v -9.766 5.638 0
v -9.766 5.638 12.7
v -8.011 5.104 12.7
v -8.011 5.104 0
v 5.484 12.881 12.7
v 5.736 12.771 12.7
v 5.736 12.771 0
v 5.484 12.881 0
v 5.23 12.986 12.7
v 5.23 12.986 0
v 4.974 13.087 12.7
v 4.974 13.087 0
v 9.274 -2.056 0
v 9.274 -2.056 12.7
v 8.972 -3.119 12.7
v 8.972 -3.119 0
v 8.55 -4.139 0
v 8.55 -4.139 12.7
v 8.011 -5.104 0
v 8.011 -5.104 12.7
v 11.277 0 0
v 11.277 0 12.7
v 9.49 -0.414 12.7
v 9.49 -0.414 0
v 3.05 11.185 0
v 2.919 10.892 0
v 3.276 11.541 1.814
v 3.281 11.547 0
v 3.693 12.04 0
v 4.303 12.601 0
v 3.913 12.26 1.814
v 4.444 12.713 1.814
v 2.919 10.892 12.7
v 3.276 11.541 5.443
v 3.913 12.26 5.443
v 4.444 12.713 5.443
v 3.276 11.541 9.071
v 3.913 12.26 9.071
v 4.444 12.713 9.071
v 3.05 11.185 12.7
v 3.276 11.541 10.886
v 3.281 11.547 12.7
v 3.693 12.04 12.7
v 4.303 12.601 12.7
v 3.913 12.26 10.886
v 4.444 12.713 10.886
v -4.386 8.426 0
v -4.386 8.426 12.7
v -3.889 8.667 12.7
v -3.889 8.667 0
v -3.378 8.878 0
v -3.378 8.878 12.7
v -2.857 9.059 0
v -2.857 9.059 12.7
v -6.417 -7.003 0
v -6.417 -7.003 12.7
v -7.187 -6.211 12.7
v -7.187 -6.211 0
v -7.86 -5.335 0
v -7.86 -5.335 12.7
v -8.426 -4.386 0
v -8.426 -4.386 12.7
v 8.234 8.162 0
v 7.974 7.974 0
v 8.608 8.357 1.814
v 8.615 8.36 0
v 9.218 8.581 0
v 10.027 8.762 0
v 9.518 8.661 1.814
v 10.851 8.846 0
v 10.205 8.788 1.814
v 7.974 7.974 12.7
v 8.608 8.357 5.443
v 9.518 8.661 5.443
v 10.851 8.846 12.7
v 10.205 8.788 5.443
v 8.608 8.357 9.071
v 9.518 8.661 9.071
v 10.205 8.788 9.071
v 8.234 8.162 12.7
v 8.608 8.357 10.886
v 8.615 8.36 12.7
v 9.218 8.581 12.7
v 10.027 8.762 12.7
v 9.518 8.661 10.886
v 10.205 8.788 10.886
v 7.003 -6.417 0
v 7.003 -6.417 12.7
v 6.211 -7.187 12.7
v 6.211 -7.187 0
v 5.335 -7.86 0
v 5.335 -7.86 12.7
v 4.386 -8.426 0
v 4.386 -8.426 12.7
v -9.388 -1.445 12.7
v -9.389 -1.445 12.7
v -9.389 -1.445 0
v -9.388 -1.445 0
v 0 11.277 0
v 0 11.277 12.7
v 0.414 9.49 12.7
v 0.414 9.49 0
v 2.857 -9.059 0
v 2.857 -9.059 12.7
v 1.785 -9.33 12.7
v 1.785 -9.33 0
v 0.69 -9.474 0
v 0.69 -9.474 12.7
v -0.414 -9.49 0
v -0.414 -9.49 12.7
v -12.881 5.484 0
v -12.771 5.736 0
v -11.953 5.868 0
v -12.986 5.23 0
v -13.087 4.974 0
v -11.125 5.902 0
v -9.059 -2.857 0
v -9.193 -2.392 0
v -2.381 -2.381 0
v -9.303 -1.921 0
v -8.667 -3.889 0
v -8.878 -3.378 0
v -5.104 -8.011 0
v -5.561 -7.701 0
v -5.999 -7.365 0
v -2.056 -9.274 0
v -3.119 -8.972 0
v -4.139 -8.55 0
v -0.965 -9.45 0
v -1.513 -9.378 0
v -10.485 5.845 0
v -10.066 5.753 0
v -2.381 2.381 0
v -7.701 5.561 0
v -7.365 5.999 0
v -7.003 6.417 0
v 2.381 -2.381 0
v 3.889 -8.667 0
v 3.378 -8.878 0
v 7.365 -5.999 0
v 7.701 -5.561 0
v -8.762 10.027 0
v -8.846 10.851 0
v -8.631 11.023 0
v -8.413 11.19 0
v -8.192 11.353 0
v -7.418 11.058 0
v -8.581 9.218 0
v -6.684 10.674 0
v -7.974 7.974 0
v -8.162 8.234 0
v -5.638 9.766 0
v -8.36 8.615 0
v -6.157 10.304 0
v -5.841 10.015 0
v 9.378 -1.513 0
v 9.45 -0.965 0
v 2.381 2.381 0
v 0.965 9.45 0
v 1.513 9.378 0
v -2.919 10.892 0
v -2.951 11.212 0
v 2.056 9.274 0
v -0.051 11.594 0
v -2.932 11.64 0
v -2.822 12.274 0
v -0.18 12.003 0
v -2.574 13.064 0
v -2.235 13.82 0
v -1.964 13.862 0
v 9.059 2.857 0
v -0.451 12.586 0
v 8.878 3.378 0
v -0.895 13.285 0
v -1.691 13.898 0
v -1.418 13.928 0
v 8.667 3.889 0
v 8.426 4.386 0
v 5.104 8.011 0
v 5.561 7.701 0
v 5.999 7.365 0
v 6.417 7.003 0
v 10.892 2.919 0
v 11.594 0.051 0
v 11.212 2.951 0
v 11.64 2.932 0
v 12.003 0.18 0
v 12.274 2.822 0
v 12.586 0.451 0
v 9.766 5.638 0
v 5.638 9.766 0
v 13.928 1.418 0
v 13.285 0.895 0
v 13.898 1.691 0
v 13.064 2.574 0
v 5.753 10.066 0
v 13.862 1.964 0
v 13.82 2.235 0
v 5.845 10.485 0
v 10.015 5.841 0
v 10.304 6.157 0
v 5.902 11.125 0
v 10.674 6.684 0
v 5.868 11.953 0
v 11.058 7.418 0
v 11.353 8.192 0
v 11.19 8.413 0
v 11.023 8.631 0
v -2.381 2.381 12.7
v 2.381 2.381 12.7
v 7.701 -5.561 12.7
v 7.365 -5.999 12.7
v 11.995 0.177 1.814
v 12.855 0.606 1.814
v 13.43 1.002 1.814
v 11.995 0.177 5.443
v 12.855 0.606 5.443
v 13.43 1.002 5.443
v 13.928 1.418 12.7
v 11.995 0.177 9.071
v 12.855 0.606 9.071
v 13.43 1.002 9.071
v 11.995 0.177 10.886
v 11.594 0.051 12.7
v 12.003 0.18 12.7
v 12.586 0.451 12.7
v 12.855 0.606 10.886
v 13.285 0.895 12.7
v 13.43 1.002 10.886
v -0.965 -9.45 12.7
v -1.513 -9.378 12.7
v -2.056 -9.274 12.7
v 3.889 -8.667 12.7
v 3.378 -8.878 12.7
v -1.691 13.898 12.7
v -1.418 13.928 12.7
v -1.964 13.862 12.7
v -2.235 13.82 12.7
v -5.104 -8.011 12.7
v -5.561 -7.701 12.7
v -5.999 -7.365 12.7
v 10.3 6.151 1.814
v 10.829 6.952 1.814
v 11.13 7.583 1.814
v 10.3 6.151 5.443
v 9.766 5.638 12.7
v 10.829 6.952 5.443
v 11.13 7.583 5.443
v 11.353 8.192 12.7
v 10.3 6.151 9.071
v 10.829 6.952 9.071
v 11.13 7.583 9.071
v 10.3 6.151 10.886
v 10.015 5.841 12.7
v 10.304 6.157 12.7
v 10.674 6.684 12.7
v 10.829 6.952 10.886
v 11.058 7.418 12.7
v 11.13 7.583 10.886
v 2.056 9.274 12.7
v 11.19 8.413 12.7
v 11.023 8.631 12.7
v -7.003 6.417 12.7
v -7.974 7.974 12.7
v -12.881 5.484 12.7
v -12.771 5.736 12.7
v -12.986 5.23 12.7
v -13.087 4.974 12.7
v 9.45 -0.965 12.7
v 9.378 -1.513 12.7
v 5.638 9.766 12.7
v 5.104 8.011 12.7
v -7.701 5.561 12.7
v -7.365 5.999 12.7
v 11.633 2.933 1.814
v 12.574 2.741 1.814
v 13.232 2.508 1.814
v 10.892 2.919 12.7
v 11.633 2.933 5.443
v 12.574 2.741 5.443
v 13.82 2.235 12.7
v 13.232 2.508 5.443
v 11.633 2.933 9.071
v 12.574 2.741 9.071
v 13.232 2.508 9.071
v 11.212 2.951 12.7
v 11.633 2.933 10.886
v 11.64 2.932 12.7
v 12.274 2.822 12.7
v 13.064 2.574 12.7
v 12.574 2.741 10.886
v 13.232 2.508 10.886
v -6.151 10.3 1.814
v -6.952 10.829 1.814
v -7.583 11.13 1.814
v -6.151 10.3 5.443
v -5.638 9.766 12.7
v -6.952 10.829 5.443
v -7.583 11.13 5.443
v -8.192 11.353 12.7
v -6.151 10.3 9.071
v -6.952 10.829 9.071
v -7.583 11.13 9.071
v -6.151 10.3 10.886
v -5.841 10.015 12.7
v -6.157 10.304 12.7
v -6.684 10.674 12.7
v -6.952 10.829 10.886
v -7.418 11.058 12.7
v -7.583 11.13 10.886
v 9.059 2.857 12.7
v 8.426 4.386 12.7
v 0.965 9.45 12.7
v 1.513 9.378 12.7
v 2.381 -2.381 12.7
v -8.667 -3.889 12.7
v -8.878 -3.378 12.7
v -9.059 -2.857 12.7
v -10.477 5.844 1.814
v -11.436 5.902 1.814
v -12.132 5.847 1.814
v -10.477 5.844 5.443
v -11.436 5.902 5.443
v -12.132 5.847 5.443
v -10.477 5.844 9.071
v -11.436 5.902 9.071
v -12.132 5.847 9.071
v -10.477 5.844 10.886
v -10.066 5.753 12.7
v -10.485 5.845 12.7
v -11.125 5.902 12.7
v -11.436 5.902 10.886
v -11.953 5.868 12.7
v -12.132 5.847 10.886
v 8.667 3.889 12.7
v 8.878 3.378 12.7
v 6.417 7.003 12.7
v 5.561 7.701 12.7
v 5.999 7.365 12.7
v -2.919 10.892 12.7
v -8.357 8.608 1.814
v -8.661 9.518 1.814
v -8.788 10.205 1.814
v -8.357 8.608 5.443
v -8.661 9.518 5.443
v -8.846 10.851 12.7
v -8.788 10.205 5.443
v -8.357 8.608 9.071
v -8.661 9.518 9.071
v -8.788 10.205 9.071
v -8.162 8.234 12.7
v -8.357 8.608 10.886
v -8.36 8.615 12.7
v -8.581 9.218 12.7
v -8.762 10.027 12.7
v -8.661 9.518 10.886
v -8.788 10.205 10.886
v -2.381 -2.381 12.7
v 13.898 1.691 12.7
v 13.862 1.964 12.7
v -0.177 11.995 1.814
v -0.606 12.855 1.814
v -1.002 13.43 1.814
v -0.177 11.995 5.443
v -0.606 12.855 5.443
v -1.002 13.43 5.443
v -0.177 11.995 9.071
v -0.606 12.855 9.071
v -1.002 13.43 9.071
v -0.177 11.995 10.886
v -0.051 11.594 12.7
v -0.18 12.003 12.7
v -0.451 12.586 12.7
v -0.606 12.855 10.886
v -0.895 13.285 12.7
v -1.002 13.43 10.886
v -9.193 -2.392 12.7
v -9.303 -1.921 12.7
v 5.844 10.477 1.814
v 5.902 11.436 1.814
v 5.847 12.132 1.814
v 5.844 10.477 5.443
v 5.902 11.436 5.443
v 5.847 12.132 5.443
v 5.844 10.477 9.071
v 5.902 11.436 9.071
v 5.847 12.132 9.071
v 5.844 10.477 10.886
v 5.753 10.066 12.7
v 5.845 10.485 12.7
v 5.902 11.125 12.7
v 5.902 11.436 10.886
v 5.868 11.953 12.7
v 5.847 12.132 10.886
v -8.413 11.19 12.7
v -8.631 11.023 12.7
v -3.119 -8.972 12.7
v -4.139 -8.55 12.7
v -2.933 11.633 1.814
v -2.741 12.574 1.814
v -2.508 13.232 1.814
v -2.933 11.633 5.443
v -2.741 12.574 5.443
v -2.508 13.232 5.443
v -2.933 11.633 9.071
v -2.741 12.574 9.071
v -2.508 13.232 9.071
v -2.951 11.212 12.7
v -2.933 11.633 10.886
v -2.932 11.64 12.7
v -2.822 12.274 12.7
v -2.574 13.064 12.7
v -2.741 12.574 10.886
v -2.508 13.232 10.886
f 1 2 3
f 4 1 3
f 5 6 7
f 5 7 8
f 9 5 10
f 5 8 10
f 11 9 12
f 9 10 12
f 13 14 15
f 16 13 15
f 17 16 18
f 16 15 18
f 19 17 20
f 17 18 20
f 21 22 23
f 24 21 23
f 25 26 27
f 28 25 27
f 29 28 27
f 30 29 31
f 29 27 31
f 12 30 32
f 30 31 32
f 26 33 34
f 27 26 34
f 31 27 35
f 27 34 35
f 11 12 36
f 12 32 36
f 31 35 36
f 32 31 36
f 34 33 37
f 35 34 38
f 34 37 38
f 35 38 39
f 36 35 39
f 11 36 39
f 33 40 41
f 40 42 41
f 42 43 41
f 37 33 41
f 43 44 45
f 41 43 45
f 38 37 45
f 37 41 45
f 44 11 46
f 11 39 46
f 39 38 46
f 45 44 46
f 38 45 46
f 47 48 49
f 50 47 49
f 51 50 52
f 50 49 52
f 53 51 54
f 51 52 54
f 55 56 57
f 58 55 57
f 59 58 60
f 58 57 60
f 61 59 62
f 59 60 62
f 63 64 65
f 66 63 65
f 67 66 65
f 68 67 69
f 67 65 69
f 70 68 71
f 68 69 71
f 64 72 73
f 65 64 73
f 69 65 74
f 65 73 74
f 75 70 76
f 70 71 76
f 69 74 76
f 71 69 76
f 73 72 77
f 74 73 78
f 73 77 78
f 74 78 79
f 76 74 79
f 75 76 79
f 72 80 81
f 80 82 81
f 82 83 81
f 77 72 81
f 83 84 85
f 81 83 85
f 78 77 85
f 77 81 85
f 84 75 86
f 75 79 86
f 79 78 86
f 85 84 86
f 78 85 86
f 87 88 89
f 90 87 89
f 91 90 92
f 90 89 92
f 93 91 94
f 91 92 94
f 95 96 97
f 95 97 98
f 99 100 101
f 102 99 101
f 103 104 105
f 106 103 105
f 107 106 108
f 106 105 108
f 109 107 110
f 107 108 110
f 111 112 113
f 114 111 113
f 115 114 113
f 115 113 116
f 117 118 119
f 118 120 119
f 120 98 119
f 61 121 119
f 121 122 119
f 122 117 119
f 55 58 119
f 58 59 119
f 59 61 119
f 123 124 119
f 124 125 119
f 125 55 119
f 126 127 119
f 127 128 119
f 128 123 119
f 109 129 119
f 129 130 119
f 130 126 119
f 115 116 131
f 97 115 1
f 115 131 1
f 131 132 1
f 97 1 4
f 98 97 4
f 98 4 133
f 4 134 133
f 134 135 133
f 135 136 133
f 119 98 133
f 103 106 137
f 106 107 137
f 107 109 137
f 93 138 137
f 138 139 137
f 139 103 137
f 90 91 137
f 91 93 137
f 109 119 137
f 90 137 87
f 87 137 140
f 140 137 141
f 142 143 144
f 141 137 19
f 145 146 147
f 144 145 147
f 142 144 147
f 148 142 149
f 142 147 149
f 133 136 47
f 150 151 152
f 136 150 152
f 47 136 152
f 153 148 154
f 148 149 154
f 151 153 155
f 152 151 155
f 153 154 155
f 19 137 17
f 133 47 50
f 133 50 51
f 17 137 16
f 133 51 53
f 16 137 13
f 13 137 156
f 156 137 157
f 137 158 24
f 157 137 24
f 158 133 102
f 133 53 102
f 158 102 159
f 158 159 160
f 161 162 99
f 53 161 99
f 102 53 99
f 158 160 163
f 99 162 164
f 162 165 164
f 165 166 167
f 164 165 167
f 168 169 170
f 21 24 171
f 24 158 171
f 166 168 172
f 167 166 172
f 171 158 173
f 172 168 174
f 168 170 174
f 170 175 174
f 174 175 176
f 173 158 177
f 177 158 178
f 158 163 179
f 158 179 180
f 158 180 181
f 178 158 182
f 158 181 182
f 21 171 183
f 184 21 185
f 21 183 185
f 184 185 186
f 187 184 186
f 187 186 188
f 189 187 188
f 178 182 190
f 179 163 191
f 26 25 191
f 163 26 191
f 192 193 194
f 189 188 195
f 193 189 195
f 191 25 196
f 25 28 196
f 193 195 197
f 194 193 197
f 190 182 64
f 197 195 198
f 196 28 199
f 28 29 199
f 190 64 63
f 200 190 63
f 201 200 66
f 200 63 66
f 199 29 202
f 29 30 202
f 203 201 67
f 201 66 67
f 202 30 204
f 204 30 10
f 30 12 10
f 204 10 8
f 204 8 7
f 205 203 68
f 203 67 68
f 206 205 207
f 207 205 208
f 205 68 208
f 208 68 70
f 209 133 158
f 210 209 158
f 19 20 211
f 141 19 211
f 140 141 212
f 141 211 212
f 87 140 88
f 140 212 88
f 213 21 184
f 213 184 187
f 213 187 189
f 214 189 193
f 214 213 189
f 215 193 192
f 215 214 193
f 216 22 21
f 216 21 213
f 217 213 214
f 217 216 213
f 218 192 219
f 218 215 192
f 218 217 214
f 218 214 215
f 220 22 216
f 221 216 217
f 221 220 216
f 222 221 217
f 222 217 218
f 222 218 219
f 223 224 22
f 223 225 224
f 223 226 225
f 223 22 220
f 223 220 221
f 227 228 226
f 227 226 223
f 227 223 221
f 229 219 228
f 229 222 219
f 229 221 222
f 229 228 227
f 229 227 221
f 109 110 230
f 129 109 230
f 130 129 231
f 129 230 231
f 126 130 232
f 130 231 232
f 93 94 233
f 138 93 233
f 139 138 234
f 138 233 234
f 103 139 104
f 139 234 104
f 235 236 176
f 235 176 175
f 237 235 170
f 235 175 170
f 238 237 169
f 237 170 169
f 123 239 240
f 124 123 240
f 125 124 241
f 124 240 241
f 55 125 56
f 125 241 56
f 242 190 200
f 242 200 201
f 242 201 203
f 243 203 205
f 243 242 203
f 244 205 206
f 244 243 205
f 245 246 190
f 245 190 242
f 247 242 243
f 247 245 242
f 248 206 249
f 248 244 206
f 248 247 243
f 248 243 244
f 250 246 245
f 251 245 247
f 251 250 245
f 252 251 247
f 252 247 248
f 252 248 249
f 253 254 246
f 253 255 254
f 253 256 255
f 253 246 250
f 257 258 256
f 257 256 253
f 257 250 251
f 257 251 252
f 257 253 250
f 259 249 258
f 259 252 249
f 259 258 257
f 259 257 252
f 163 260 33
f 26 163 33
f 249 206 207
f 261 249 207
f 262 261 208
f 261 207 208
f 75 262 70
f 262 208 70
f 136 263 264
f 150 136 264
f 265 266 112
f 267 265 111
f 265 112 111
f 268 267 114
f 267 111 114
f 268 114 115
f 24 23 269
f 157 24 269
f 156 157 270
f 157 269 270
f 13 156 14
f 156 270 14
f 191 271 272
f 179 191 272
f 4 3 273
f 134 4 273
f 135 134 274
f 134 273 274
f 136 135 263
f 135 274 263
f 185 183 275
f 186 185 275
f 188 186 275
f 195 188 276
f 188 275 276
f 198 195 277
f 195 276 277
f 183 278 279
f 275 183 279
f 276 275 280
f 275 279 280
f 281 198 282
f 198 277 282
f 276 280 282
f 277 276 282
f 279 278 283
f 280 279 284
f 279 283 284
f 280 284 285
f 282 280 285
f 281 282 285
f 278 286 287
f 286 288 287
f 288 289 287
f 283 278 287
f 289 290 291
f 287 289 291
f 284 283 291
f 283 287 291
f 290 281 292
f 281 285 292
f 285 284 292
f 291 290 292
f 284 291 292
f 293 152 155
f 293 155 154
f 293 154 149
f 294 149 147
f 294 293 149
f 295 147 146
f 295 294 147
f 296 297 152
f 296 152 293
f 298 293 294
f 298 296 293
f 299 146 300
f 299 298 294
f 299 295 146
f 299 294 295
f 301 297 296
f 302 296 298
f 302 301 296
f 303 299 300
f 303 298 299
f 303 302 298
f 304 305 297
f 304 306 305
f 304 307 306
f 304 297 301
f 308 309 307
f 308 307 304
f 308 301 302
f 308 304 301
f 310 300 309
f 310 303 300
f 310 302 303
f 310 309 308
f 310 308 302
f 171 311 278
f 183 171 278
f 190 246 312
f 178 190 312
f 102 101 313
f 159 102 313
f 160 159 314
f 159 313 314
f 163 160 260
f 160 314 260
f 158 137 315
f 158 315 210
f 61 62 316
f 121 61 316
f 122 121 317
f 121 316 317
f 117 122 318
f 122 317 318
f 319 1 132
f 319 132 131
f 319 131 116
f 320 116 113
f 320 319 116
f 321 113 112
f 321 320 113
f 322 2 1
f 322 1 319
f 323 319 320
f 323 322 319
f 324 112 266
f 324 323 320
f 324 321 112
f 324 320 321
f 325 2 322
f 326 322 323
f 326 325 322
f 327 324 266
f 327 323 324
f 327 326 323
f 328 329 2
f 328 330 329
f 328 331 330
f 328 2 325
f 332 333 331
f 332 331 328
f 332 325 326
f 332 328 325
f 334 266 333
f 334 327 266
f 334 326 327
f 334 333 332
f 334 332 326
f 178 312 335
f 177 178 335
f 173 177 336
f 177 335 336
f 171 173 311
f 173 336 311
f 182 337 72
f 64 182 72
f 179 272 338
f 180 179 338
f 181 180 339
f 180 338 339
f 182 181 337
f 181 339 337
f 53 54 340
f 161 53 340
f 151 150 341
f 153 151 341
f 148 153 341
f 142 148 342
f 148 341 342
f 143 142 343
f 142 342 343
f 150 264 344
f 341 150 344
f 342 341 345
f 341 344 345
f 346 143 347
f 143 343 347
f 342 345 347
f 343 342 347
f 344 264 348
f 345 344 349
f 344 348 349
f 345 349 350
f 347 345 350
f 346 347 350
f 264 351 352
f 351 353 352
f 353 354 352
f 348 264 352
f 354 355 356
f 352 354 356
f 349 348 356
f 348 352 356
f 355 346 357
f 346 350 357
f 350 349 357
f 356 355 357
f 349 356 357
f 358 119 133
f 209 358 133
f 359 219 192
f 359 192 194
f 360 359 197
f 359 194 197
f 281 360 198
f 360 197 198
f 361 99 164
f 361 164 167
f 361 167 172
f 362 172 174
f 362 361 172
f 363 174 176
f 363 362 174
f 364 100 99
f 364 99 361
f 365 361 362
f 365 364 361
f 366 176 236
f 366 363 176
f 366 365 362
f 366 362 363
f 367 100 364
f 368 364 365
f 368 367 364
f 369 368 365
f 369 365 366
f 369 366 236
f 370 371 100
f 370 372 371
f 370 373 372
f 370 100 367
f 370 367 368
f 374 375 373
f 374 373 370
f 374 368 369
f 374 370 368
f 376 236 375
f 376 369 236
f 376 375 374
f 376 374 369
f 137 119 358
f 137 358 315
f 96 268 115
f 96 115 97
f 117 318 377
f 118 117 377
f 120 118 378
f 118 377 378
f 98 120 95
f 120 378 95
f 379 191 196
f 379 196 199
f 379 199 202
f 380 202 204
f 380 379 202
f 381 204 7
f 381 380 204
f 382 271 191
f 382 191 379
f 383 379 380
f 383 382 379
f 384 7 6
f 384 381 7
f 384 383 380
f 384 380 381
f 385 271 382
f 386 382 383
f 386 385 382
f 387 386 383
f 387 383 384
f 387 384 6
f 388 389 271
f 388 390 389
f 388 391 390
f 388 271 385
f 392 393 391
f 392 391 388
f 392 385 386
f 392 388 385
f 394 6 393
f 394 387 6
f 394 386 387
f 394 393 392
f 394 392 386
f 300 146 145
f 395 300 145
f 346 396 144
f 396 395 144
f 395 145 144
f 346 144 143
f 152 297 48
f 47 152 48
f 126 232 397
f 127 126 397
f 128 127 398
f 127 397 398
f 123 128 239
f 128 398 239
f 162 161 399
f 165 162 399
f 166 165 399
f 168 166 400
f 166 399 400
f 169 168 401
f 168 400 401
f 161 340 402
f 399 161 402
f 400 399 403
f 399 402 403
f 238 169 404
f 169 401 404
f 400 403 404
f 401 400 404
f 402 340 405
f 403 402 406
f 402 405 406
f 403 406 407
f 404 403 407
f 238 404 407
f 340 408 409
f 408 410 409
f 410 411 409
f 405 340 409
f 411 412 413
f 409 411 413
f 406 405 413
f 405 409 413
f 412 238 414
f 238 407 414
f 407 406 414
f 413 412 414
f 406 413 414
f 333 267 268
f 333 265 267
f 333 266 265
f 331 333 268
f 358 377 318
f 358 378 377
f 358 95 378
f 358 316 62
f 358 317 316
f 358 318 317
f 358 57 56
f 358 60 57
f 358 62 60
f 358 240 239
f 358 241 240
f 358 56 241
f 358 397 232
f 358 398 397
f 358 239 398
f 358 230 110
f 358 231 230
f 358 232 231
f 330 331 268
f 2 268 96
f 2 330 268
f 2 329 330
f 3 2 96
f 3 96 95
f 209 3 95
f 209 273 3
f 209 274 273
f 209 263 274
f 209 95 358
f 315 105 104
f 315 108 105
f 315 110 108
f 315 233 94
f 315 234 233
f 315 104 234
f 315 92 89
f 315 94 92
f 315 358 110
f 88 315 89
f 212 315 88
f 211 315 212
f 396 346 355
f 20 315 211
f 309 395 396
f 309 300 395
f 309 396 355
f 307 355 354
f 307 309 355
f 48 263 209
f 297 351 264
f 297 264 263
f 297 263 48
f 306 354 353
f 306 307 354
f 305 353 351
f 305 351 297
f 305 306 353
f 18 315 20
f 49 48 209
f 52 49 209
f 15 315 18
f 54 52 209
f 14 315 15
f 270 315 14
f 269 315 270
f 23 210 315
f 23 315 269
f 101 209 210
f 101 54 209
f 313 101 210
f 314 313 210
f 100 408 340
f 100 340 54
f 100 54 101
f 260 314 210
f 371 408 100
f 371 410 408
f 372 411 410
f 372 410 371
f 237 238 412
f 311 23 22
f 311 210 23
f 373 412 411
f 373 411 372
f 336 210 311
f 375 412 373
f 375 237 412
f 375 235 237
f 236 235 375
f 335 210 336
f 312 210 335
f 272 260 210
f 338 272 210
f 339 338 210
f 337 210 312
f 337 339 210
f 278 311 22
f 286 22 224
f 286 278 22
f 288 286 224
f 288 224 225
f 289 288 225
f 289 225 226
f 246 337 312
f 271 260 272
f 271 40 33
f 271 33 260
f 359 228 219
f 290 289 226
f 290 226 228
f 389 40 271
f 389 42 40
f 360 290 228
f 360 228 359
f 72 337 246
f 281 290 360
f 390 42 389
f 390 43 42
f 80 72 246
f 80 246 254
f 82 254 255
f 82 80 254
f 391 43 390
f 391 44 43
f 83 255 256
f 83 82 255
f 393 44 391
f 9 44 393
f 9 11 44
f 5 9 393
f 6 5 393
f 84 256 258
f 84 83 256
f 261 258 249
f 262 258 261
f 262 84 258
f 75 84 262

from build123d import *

# Parameters (mm, degrees)
SKETCH1_R           = 14
SKETCH1_W           = 4.7625
SKETCH1_H           = 4.7625
BOSS_EXTRUDE1_DEPTH = 12.7
CUT_EXTRUDE2_DEPTH  = 12.7
CIRPATTERN1_COUNT   = 12
CUT_EXTRUDE3_DEPTH  = 12.7
BOSS_EXTRUDE2_DEPTH = 12.7


with BuildPart() as part:
    # Sketch1 → Boss-Extrude1 (new body)
    with BuildSketch(Plane.XY):
        Circle(SKETCH1_R)
        Rectangle(SKETCH1_W, SKETCH1_H, mode=Mode.SUBTRACT)
    extrude(amount=BOSS_EXTRUDE1_DEPTH)

    # Sketch2 → Cut-Extrude2 (cut)
    with BuildSketch(Plane.XY.offset(12.7)):
        with BuildLine():
            Line((9.765735466, 5.63825), (8.425772987, 4.386040421))
            ThreePointArc((8.425772987, 4.386040421), (8.775931679, 3.635109924), (9.05932014, 2.856522291))
            Line((9.05932014, 2.856522291), (10.89226258, 2.918572962))
            add(Edge.make_bspline(
                [(10.89226258, 2.918572962), (10.926225774, 2.926110483), (11.022290818, 2.942700204), (11.208093043, 2.95599604), (11.510593122, 2.951165366), (11.900233077, 2.905990048), (12.393614042, 2.803046766), (12.953297572, 2.62879349), (13.387020142, 2.449311198), (13.697491187, 2.299105356), (13.848549614, 2.220883572)],
                knots=[0, 0, 0, 0, 0, 0.005604071, 0.015718253, 0.029959921, 0.048733673, 0.068727069, 0.096888899, 0.124316379, 0.124316379, 0.124316379, 0.124316379, 0.124316379], degree=4))
            ThreePointArc((13.848549614, 2.220883572), (12.957872383, 5.367326481), (11.362805176, 8.222001507))
            add(Edge.make_bspline(
                [(9.765735466, 5.63825), (9.795080903, 5.656935773), (9.874739851, 5.713133312), (10.01552344, 5.835113749), (10.226007495, 6.052429409), (10.469580775, 6.359890238), (10.745661909, 6.781555156), (11.018202255, 7.300526849), (11.197977279, 7.734128165), (11.311301892, 8.059875916), (11.362805176, 8.222001507)],
                knots=[0, 0, 0, 0, 0, 0.005604071, 0.015718253, 0.029959921, 0.048733673, 0.068727069, 0.096888899, 0.124316379, 0.124316379, 0.124316379, 0.124316379, 0.124316379], degree=4))
        make_face()
    cut_extrude2 = extrude(amount=-CUT_EXTRUDE2_DEPTH, mode=Mode.SUBTRACT)

    # CirPattern1: Cut-Extrude2 ×12 about axis
    cirpattern1_axis = Axis((0, 0, 12.7), (0, 0, -1))
    for i in range(1, CIRPATTERN1_COUNT):
        add(cut_extrude2.rotate(cirpattern1_axis, i * 360 / CIRPATTERN1_COUNT), mode=Mode.SUBTRACT)

    # Sketch4 → Cut-Extrude3 (cut)
    with BuildSketch(Plane.XY.offset(12.7)):
        with BuildLine():
            Line((-9.431447157, 1.130842839), (-13.900437961, 1.666680677))
            ThreePointArc((-13.900437961, 1.666680677), (-1.645492098, -13.902962122), (13.905453984, -1.624299696))
            Line((13.905453984, -1.624299696), (9.434850528, -1.102087344))
            ThreePointArc((9.434850528, -1.102087344), (-1.116466388, -9.4331598), (-9.431447157, 1.130842839))
        make_face()
    extrude(amount=-CUT_EXTRUDE3_DEPTH, mode=Mode.SUBTRACT)

    # Sketch5 → Boss-Extrude2 (add)
    with BuildSketch(Plane.XY.offset(12.7)):
        with BuildLine():
            Line((-13.086503174, 4.974277301), (-9.389446127, -1.445095645))
            Line((-9.389446127, -1.445095645), (-9.388388384, -1.445394253))
            ThreePointArc((-9.388388384, -1.445394253), (-9.484867836, -0.517960557), (-9.489953664, 0.414464066))
            ThreePointArc((-9.489953664, 0.414464066), (-9.417734738, 1.2398683), (-9.273862528, 2.055839199))
            Line((-9.273862528, 2.055839199), (-10.89226258, 2.918572962))
            add(Edge.make_bspline(
                [(-10.89226258, 2.918572962), (-10.925444329, 2.929026875), (-11.016933958, 2.962692277), (-11.184491323, 3.044078857), (-11.444048739, 3.199512383), (-11.75889918, 3.433455334), (-12.134707988, 3.769297313), (-12.526899585, 4.194215821), (-12.808483679, 4.559768992), (-12.998544728, 4.838012668), (-13.086503174, 4.974277301)],
                knots=[0, 0, 0, 0, 0, 0.005604071, 0.015718253, 0.029959921, 0.048733673, 0.068727069, 0.096888899, 0.123039083, 0.123039083, 0.123039083, 0.123039083, 0.123039083], degree=4))
        make_face()
    extrude(amount=-BOSS_EXTRUDE2_DEPTH)


solid = part.part
